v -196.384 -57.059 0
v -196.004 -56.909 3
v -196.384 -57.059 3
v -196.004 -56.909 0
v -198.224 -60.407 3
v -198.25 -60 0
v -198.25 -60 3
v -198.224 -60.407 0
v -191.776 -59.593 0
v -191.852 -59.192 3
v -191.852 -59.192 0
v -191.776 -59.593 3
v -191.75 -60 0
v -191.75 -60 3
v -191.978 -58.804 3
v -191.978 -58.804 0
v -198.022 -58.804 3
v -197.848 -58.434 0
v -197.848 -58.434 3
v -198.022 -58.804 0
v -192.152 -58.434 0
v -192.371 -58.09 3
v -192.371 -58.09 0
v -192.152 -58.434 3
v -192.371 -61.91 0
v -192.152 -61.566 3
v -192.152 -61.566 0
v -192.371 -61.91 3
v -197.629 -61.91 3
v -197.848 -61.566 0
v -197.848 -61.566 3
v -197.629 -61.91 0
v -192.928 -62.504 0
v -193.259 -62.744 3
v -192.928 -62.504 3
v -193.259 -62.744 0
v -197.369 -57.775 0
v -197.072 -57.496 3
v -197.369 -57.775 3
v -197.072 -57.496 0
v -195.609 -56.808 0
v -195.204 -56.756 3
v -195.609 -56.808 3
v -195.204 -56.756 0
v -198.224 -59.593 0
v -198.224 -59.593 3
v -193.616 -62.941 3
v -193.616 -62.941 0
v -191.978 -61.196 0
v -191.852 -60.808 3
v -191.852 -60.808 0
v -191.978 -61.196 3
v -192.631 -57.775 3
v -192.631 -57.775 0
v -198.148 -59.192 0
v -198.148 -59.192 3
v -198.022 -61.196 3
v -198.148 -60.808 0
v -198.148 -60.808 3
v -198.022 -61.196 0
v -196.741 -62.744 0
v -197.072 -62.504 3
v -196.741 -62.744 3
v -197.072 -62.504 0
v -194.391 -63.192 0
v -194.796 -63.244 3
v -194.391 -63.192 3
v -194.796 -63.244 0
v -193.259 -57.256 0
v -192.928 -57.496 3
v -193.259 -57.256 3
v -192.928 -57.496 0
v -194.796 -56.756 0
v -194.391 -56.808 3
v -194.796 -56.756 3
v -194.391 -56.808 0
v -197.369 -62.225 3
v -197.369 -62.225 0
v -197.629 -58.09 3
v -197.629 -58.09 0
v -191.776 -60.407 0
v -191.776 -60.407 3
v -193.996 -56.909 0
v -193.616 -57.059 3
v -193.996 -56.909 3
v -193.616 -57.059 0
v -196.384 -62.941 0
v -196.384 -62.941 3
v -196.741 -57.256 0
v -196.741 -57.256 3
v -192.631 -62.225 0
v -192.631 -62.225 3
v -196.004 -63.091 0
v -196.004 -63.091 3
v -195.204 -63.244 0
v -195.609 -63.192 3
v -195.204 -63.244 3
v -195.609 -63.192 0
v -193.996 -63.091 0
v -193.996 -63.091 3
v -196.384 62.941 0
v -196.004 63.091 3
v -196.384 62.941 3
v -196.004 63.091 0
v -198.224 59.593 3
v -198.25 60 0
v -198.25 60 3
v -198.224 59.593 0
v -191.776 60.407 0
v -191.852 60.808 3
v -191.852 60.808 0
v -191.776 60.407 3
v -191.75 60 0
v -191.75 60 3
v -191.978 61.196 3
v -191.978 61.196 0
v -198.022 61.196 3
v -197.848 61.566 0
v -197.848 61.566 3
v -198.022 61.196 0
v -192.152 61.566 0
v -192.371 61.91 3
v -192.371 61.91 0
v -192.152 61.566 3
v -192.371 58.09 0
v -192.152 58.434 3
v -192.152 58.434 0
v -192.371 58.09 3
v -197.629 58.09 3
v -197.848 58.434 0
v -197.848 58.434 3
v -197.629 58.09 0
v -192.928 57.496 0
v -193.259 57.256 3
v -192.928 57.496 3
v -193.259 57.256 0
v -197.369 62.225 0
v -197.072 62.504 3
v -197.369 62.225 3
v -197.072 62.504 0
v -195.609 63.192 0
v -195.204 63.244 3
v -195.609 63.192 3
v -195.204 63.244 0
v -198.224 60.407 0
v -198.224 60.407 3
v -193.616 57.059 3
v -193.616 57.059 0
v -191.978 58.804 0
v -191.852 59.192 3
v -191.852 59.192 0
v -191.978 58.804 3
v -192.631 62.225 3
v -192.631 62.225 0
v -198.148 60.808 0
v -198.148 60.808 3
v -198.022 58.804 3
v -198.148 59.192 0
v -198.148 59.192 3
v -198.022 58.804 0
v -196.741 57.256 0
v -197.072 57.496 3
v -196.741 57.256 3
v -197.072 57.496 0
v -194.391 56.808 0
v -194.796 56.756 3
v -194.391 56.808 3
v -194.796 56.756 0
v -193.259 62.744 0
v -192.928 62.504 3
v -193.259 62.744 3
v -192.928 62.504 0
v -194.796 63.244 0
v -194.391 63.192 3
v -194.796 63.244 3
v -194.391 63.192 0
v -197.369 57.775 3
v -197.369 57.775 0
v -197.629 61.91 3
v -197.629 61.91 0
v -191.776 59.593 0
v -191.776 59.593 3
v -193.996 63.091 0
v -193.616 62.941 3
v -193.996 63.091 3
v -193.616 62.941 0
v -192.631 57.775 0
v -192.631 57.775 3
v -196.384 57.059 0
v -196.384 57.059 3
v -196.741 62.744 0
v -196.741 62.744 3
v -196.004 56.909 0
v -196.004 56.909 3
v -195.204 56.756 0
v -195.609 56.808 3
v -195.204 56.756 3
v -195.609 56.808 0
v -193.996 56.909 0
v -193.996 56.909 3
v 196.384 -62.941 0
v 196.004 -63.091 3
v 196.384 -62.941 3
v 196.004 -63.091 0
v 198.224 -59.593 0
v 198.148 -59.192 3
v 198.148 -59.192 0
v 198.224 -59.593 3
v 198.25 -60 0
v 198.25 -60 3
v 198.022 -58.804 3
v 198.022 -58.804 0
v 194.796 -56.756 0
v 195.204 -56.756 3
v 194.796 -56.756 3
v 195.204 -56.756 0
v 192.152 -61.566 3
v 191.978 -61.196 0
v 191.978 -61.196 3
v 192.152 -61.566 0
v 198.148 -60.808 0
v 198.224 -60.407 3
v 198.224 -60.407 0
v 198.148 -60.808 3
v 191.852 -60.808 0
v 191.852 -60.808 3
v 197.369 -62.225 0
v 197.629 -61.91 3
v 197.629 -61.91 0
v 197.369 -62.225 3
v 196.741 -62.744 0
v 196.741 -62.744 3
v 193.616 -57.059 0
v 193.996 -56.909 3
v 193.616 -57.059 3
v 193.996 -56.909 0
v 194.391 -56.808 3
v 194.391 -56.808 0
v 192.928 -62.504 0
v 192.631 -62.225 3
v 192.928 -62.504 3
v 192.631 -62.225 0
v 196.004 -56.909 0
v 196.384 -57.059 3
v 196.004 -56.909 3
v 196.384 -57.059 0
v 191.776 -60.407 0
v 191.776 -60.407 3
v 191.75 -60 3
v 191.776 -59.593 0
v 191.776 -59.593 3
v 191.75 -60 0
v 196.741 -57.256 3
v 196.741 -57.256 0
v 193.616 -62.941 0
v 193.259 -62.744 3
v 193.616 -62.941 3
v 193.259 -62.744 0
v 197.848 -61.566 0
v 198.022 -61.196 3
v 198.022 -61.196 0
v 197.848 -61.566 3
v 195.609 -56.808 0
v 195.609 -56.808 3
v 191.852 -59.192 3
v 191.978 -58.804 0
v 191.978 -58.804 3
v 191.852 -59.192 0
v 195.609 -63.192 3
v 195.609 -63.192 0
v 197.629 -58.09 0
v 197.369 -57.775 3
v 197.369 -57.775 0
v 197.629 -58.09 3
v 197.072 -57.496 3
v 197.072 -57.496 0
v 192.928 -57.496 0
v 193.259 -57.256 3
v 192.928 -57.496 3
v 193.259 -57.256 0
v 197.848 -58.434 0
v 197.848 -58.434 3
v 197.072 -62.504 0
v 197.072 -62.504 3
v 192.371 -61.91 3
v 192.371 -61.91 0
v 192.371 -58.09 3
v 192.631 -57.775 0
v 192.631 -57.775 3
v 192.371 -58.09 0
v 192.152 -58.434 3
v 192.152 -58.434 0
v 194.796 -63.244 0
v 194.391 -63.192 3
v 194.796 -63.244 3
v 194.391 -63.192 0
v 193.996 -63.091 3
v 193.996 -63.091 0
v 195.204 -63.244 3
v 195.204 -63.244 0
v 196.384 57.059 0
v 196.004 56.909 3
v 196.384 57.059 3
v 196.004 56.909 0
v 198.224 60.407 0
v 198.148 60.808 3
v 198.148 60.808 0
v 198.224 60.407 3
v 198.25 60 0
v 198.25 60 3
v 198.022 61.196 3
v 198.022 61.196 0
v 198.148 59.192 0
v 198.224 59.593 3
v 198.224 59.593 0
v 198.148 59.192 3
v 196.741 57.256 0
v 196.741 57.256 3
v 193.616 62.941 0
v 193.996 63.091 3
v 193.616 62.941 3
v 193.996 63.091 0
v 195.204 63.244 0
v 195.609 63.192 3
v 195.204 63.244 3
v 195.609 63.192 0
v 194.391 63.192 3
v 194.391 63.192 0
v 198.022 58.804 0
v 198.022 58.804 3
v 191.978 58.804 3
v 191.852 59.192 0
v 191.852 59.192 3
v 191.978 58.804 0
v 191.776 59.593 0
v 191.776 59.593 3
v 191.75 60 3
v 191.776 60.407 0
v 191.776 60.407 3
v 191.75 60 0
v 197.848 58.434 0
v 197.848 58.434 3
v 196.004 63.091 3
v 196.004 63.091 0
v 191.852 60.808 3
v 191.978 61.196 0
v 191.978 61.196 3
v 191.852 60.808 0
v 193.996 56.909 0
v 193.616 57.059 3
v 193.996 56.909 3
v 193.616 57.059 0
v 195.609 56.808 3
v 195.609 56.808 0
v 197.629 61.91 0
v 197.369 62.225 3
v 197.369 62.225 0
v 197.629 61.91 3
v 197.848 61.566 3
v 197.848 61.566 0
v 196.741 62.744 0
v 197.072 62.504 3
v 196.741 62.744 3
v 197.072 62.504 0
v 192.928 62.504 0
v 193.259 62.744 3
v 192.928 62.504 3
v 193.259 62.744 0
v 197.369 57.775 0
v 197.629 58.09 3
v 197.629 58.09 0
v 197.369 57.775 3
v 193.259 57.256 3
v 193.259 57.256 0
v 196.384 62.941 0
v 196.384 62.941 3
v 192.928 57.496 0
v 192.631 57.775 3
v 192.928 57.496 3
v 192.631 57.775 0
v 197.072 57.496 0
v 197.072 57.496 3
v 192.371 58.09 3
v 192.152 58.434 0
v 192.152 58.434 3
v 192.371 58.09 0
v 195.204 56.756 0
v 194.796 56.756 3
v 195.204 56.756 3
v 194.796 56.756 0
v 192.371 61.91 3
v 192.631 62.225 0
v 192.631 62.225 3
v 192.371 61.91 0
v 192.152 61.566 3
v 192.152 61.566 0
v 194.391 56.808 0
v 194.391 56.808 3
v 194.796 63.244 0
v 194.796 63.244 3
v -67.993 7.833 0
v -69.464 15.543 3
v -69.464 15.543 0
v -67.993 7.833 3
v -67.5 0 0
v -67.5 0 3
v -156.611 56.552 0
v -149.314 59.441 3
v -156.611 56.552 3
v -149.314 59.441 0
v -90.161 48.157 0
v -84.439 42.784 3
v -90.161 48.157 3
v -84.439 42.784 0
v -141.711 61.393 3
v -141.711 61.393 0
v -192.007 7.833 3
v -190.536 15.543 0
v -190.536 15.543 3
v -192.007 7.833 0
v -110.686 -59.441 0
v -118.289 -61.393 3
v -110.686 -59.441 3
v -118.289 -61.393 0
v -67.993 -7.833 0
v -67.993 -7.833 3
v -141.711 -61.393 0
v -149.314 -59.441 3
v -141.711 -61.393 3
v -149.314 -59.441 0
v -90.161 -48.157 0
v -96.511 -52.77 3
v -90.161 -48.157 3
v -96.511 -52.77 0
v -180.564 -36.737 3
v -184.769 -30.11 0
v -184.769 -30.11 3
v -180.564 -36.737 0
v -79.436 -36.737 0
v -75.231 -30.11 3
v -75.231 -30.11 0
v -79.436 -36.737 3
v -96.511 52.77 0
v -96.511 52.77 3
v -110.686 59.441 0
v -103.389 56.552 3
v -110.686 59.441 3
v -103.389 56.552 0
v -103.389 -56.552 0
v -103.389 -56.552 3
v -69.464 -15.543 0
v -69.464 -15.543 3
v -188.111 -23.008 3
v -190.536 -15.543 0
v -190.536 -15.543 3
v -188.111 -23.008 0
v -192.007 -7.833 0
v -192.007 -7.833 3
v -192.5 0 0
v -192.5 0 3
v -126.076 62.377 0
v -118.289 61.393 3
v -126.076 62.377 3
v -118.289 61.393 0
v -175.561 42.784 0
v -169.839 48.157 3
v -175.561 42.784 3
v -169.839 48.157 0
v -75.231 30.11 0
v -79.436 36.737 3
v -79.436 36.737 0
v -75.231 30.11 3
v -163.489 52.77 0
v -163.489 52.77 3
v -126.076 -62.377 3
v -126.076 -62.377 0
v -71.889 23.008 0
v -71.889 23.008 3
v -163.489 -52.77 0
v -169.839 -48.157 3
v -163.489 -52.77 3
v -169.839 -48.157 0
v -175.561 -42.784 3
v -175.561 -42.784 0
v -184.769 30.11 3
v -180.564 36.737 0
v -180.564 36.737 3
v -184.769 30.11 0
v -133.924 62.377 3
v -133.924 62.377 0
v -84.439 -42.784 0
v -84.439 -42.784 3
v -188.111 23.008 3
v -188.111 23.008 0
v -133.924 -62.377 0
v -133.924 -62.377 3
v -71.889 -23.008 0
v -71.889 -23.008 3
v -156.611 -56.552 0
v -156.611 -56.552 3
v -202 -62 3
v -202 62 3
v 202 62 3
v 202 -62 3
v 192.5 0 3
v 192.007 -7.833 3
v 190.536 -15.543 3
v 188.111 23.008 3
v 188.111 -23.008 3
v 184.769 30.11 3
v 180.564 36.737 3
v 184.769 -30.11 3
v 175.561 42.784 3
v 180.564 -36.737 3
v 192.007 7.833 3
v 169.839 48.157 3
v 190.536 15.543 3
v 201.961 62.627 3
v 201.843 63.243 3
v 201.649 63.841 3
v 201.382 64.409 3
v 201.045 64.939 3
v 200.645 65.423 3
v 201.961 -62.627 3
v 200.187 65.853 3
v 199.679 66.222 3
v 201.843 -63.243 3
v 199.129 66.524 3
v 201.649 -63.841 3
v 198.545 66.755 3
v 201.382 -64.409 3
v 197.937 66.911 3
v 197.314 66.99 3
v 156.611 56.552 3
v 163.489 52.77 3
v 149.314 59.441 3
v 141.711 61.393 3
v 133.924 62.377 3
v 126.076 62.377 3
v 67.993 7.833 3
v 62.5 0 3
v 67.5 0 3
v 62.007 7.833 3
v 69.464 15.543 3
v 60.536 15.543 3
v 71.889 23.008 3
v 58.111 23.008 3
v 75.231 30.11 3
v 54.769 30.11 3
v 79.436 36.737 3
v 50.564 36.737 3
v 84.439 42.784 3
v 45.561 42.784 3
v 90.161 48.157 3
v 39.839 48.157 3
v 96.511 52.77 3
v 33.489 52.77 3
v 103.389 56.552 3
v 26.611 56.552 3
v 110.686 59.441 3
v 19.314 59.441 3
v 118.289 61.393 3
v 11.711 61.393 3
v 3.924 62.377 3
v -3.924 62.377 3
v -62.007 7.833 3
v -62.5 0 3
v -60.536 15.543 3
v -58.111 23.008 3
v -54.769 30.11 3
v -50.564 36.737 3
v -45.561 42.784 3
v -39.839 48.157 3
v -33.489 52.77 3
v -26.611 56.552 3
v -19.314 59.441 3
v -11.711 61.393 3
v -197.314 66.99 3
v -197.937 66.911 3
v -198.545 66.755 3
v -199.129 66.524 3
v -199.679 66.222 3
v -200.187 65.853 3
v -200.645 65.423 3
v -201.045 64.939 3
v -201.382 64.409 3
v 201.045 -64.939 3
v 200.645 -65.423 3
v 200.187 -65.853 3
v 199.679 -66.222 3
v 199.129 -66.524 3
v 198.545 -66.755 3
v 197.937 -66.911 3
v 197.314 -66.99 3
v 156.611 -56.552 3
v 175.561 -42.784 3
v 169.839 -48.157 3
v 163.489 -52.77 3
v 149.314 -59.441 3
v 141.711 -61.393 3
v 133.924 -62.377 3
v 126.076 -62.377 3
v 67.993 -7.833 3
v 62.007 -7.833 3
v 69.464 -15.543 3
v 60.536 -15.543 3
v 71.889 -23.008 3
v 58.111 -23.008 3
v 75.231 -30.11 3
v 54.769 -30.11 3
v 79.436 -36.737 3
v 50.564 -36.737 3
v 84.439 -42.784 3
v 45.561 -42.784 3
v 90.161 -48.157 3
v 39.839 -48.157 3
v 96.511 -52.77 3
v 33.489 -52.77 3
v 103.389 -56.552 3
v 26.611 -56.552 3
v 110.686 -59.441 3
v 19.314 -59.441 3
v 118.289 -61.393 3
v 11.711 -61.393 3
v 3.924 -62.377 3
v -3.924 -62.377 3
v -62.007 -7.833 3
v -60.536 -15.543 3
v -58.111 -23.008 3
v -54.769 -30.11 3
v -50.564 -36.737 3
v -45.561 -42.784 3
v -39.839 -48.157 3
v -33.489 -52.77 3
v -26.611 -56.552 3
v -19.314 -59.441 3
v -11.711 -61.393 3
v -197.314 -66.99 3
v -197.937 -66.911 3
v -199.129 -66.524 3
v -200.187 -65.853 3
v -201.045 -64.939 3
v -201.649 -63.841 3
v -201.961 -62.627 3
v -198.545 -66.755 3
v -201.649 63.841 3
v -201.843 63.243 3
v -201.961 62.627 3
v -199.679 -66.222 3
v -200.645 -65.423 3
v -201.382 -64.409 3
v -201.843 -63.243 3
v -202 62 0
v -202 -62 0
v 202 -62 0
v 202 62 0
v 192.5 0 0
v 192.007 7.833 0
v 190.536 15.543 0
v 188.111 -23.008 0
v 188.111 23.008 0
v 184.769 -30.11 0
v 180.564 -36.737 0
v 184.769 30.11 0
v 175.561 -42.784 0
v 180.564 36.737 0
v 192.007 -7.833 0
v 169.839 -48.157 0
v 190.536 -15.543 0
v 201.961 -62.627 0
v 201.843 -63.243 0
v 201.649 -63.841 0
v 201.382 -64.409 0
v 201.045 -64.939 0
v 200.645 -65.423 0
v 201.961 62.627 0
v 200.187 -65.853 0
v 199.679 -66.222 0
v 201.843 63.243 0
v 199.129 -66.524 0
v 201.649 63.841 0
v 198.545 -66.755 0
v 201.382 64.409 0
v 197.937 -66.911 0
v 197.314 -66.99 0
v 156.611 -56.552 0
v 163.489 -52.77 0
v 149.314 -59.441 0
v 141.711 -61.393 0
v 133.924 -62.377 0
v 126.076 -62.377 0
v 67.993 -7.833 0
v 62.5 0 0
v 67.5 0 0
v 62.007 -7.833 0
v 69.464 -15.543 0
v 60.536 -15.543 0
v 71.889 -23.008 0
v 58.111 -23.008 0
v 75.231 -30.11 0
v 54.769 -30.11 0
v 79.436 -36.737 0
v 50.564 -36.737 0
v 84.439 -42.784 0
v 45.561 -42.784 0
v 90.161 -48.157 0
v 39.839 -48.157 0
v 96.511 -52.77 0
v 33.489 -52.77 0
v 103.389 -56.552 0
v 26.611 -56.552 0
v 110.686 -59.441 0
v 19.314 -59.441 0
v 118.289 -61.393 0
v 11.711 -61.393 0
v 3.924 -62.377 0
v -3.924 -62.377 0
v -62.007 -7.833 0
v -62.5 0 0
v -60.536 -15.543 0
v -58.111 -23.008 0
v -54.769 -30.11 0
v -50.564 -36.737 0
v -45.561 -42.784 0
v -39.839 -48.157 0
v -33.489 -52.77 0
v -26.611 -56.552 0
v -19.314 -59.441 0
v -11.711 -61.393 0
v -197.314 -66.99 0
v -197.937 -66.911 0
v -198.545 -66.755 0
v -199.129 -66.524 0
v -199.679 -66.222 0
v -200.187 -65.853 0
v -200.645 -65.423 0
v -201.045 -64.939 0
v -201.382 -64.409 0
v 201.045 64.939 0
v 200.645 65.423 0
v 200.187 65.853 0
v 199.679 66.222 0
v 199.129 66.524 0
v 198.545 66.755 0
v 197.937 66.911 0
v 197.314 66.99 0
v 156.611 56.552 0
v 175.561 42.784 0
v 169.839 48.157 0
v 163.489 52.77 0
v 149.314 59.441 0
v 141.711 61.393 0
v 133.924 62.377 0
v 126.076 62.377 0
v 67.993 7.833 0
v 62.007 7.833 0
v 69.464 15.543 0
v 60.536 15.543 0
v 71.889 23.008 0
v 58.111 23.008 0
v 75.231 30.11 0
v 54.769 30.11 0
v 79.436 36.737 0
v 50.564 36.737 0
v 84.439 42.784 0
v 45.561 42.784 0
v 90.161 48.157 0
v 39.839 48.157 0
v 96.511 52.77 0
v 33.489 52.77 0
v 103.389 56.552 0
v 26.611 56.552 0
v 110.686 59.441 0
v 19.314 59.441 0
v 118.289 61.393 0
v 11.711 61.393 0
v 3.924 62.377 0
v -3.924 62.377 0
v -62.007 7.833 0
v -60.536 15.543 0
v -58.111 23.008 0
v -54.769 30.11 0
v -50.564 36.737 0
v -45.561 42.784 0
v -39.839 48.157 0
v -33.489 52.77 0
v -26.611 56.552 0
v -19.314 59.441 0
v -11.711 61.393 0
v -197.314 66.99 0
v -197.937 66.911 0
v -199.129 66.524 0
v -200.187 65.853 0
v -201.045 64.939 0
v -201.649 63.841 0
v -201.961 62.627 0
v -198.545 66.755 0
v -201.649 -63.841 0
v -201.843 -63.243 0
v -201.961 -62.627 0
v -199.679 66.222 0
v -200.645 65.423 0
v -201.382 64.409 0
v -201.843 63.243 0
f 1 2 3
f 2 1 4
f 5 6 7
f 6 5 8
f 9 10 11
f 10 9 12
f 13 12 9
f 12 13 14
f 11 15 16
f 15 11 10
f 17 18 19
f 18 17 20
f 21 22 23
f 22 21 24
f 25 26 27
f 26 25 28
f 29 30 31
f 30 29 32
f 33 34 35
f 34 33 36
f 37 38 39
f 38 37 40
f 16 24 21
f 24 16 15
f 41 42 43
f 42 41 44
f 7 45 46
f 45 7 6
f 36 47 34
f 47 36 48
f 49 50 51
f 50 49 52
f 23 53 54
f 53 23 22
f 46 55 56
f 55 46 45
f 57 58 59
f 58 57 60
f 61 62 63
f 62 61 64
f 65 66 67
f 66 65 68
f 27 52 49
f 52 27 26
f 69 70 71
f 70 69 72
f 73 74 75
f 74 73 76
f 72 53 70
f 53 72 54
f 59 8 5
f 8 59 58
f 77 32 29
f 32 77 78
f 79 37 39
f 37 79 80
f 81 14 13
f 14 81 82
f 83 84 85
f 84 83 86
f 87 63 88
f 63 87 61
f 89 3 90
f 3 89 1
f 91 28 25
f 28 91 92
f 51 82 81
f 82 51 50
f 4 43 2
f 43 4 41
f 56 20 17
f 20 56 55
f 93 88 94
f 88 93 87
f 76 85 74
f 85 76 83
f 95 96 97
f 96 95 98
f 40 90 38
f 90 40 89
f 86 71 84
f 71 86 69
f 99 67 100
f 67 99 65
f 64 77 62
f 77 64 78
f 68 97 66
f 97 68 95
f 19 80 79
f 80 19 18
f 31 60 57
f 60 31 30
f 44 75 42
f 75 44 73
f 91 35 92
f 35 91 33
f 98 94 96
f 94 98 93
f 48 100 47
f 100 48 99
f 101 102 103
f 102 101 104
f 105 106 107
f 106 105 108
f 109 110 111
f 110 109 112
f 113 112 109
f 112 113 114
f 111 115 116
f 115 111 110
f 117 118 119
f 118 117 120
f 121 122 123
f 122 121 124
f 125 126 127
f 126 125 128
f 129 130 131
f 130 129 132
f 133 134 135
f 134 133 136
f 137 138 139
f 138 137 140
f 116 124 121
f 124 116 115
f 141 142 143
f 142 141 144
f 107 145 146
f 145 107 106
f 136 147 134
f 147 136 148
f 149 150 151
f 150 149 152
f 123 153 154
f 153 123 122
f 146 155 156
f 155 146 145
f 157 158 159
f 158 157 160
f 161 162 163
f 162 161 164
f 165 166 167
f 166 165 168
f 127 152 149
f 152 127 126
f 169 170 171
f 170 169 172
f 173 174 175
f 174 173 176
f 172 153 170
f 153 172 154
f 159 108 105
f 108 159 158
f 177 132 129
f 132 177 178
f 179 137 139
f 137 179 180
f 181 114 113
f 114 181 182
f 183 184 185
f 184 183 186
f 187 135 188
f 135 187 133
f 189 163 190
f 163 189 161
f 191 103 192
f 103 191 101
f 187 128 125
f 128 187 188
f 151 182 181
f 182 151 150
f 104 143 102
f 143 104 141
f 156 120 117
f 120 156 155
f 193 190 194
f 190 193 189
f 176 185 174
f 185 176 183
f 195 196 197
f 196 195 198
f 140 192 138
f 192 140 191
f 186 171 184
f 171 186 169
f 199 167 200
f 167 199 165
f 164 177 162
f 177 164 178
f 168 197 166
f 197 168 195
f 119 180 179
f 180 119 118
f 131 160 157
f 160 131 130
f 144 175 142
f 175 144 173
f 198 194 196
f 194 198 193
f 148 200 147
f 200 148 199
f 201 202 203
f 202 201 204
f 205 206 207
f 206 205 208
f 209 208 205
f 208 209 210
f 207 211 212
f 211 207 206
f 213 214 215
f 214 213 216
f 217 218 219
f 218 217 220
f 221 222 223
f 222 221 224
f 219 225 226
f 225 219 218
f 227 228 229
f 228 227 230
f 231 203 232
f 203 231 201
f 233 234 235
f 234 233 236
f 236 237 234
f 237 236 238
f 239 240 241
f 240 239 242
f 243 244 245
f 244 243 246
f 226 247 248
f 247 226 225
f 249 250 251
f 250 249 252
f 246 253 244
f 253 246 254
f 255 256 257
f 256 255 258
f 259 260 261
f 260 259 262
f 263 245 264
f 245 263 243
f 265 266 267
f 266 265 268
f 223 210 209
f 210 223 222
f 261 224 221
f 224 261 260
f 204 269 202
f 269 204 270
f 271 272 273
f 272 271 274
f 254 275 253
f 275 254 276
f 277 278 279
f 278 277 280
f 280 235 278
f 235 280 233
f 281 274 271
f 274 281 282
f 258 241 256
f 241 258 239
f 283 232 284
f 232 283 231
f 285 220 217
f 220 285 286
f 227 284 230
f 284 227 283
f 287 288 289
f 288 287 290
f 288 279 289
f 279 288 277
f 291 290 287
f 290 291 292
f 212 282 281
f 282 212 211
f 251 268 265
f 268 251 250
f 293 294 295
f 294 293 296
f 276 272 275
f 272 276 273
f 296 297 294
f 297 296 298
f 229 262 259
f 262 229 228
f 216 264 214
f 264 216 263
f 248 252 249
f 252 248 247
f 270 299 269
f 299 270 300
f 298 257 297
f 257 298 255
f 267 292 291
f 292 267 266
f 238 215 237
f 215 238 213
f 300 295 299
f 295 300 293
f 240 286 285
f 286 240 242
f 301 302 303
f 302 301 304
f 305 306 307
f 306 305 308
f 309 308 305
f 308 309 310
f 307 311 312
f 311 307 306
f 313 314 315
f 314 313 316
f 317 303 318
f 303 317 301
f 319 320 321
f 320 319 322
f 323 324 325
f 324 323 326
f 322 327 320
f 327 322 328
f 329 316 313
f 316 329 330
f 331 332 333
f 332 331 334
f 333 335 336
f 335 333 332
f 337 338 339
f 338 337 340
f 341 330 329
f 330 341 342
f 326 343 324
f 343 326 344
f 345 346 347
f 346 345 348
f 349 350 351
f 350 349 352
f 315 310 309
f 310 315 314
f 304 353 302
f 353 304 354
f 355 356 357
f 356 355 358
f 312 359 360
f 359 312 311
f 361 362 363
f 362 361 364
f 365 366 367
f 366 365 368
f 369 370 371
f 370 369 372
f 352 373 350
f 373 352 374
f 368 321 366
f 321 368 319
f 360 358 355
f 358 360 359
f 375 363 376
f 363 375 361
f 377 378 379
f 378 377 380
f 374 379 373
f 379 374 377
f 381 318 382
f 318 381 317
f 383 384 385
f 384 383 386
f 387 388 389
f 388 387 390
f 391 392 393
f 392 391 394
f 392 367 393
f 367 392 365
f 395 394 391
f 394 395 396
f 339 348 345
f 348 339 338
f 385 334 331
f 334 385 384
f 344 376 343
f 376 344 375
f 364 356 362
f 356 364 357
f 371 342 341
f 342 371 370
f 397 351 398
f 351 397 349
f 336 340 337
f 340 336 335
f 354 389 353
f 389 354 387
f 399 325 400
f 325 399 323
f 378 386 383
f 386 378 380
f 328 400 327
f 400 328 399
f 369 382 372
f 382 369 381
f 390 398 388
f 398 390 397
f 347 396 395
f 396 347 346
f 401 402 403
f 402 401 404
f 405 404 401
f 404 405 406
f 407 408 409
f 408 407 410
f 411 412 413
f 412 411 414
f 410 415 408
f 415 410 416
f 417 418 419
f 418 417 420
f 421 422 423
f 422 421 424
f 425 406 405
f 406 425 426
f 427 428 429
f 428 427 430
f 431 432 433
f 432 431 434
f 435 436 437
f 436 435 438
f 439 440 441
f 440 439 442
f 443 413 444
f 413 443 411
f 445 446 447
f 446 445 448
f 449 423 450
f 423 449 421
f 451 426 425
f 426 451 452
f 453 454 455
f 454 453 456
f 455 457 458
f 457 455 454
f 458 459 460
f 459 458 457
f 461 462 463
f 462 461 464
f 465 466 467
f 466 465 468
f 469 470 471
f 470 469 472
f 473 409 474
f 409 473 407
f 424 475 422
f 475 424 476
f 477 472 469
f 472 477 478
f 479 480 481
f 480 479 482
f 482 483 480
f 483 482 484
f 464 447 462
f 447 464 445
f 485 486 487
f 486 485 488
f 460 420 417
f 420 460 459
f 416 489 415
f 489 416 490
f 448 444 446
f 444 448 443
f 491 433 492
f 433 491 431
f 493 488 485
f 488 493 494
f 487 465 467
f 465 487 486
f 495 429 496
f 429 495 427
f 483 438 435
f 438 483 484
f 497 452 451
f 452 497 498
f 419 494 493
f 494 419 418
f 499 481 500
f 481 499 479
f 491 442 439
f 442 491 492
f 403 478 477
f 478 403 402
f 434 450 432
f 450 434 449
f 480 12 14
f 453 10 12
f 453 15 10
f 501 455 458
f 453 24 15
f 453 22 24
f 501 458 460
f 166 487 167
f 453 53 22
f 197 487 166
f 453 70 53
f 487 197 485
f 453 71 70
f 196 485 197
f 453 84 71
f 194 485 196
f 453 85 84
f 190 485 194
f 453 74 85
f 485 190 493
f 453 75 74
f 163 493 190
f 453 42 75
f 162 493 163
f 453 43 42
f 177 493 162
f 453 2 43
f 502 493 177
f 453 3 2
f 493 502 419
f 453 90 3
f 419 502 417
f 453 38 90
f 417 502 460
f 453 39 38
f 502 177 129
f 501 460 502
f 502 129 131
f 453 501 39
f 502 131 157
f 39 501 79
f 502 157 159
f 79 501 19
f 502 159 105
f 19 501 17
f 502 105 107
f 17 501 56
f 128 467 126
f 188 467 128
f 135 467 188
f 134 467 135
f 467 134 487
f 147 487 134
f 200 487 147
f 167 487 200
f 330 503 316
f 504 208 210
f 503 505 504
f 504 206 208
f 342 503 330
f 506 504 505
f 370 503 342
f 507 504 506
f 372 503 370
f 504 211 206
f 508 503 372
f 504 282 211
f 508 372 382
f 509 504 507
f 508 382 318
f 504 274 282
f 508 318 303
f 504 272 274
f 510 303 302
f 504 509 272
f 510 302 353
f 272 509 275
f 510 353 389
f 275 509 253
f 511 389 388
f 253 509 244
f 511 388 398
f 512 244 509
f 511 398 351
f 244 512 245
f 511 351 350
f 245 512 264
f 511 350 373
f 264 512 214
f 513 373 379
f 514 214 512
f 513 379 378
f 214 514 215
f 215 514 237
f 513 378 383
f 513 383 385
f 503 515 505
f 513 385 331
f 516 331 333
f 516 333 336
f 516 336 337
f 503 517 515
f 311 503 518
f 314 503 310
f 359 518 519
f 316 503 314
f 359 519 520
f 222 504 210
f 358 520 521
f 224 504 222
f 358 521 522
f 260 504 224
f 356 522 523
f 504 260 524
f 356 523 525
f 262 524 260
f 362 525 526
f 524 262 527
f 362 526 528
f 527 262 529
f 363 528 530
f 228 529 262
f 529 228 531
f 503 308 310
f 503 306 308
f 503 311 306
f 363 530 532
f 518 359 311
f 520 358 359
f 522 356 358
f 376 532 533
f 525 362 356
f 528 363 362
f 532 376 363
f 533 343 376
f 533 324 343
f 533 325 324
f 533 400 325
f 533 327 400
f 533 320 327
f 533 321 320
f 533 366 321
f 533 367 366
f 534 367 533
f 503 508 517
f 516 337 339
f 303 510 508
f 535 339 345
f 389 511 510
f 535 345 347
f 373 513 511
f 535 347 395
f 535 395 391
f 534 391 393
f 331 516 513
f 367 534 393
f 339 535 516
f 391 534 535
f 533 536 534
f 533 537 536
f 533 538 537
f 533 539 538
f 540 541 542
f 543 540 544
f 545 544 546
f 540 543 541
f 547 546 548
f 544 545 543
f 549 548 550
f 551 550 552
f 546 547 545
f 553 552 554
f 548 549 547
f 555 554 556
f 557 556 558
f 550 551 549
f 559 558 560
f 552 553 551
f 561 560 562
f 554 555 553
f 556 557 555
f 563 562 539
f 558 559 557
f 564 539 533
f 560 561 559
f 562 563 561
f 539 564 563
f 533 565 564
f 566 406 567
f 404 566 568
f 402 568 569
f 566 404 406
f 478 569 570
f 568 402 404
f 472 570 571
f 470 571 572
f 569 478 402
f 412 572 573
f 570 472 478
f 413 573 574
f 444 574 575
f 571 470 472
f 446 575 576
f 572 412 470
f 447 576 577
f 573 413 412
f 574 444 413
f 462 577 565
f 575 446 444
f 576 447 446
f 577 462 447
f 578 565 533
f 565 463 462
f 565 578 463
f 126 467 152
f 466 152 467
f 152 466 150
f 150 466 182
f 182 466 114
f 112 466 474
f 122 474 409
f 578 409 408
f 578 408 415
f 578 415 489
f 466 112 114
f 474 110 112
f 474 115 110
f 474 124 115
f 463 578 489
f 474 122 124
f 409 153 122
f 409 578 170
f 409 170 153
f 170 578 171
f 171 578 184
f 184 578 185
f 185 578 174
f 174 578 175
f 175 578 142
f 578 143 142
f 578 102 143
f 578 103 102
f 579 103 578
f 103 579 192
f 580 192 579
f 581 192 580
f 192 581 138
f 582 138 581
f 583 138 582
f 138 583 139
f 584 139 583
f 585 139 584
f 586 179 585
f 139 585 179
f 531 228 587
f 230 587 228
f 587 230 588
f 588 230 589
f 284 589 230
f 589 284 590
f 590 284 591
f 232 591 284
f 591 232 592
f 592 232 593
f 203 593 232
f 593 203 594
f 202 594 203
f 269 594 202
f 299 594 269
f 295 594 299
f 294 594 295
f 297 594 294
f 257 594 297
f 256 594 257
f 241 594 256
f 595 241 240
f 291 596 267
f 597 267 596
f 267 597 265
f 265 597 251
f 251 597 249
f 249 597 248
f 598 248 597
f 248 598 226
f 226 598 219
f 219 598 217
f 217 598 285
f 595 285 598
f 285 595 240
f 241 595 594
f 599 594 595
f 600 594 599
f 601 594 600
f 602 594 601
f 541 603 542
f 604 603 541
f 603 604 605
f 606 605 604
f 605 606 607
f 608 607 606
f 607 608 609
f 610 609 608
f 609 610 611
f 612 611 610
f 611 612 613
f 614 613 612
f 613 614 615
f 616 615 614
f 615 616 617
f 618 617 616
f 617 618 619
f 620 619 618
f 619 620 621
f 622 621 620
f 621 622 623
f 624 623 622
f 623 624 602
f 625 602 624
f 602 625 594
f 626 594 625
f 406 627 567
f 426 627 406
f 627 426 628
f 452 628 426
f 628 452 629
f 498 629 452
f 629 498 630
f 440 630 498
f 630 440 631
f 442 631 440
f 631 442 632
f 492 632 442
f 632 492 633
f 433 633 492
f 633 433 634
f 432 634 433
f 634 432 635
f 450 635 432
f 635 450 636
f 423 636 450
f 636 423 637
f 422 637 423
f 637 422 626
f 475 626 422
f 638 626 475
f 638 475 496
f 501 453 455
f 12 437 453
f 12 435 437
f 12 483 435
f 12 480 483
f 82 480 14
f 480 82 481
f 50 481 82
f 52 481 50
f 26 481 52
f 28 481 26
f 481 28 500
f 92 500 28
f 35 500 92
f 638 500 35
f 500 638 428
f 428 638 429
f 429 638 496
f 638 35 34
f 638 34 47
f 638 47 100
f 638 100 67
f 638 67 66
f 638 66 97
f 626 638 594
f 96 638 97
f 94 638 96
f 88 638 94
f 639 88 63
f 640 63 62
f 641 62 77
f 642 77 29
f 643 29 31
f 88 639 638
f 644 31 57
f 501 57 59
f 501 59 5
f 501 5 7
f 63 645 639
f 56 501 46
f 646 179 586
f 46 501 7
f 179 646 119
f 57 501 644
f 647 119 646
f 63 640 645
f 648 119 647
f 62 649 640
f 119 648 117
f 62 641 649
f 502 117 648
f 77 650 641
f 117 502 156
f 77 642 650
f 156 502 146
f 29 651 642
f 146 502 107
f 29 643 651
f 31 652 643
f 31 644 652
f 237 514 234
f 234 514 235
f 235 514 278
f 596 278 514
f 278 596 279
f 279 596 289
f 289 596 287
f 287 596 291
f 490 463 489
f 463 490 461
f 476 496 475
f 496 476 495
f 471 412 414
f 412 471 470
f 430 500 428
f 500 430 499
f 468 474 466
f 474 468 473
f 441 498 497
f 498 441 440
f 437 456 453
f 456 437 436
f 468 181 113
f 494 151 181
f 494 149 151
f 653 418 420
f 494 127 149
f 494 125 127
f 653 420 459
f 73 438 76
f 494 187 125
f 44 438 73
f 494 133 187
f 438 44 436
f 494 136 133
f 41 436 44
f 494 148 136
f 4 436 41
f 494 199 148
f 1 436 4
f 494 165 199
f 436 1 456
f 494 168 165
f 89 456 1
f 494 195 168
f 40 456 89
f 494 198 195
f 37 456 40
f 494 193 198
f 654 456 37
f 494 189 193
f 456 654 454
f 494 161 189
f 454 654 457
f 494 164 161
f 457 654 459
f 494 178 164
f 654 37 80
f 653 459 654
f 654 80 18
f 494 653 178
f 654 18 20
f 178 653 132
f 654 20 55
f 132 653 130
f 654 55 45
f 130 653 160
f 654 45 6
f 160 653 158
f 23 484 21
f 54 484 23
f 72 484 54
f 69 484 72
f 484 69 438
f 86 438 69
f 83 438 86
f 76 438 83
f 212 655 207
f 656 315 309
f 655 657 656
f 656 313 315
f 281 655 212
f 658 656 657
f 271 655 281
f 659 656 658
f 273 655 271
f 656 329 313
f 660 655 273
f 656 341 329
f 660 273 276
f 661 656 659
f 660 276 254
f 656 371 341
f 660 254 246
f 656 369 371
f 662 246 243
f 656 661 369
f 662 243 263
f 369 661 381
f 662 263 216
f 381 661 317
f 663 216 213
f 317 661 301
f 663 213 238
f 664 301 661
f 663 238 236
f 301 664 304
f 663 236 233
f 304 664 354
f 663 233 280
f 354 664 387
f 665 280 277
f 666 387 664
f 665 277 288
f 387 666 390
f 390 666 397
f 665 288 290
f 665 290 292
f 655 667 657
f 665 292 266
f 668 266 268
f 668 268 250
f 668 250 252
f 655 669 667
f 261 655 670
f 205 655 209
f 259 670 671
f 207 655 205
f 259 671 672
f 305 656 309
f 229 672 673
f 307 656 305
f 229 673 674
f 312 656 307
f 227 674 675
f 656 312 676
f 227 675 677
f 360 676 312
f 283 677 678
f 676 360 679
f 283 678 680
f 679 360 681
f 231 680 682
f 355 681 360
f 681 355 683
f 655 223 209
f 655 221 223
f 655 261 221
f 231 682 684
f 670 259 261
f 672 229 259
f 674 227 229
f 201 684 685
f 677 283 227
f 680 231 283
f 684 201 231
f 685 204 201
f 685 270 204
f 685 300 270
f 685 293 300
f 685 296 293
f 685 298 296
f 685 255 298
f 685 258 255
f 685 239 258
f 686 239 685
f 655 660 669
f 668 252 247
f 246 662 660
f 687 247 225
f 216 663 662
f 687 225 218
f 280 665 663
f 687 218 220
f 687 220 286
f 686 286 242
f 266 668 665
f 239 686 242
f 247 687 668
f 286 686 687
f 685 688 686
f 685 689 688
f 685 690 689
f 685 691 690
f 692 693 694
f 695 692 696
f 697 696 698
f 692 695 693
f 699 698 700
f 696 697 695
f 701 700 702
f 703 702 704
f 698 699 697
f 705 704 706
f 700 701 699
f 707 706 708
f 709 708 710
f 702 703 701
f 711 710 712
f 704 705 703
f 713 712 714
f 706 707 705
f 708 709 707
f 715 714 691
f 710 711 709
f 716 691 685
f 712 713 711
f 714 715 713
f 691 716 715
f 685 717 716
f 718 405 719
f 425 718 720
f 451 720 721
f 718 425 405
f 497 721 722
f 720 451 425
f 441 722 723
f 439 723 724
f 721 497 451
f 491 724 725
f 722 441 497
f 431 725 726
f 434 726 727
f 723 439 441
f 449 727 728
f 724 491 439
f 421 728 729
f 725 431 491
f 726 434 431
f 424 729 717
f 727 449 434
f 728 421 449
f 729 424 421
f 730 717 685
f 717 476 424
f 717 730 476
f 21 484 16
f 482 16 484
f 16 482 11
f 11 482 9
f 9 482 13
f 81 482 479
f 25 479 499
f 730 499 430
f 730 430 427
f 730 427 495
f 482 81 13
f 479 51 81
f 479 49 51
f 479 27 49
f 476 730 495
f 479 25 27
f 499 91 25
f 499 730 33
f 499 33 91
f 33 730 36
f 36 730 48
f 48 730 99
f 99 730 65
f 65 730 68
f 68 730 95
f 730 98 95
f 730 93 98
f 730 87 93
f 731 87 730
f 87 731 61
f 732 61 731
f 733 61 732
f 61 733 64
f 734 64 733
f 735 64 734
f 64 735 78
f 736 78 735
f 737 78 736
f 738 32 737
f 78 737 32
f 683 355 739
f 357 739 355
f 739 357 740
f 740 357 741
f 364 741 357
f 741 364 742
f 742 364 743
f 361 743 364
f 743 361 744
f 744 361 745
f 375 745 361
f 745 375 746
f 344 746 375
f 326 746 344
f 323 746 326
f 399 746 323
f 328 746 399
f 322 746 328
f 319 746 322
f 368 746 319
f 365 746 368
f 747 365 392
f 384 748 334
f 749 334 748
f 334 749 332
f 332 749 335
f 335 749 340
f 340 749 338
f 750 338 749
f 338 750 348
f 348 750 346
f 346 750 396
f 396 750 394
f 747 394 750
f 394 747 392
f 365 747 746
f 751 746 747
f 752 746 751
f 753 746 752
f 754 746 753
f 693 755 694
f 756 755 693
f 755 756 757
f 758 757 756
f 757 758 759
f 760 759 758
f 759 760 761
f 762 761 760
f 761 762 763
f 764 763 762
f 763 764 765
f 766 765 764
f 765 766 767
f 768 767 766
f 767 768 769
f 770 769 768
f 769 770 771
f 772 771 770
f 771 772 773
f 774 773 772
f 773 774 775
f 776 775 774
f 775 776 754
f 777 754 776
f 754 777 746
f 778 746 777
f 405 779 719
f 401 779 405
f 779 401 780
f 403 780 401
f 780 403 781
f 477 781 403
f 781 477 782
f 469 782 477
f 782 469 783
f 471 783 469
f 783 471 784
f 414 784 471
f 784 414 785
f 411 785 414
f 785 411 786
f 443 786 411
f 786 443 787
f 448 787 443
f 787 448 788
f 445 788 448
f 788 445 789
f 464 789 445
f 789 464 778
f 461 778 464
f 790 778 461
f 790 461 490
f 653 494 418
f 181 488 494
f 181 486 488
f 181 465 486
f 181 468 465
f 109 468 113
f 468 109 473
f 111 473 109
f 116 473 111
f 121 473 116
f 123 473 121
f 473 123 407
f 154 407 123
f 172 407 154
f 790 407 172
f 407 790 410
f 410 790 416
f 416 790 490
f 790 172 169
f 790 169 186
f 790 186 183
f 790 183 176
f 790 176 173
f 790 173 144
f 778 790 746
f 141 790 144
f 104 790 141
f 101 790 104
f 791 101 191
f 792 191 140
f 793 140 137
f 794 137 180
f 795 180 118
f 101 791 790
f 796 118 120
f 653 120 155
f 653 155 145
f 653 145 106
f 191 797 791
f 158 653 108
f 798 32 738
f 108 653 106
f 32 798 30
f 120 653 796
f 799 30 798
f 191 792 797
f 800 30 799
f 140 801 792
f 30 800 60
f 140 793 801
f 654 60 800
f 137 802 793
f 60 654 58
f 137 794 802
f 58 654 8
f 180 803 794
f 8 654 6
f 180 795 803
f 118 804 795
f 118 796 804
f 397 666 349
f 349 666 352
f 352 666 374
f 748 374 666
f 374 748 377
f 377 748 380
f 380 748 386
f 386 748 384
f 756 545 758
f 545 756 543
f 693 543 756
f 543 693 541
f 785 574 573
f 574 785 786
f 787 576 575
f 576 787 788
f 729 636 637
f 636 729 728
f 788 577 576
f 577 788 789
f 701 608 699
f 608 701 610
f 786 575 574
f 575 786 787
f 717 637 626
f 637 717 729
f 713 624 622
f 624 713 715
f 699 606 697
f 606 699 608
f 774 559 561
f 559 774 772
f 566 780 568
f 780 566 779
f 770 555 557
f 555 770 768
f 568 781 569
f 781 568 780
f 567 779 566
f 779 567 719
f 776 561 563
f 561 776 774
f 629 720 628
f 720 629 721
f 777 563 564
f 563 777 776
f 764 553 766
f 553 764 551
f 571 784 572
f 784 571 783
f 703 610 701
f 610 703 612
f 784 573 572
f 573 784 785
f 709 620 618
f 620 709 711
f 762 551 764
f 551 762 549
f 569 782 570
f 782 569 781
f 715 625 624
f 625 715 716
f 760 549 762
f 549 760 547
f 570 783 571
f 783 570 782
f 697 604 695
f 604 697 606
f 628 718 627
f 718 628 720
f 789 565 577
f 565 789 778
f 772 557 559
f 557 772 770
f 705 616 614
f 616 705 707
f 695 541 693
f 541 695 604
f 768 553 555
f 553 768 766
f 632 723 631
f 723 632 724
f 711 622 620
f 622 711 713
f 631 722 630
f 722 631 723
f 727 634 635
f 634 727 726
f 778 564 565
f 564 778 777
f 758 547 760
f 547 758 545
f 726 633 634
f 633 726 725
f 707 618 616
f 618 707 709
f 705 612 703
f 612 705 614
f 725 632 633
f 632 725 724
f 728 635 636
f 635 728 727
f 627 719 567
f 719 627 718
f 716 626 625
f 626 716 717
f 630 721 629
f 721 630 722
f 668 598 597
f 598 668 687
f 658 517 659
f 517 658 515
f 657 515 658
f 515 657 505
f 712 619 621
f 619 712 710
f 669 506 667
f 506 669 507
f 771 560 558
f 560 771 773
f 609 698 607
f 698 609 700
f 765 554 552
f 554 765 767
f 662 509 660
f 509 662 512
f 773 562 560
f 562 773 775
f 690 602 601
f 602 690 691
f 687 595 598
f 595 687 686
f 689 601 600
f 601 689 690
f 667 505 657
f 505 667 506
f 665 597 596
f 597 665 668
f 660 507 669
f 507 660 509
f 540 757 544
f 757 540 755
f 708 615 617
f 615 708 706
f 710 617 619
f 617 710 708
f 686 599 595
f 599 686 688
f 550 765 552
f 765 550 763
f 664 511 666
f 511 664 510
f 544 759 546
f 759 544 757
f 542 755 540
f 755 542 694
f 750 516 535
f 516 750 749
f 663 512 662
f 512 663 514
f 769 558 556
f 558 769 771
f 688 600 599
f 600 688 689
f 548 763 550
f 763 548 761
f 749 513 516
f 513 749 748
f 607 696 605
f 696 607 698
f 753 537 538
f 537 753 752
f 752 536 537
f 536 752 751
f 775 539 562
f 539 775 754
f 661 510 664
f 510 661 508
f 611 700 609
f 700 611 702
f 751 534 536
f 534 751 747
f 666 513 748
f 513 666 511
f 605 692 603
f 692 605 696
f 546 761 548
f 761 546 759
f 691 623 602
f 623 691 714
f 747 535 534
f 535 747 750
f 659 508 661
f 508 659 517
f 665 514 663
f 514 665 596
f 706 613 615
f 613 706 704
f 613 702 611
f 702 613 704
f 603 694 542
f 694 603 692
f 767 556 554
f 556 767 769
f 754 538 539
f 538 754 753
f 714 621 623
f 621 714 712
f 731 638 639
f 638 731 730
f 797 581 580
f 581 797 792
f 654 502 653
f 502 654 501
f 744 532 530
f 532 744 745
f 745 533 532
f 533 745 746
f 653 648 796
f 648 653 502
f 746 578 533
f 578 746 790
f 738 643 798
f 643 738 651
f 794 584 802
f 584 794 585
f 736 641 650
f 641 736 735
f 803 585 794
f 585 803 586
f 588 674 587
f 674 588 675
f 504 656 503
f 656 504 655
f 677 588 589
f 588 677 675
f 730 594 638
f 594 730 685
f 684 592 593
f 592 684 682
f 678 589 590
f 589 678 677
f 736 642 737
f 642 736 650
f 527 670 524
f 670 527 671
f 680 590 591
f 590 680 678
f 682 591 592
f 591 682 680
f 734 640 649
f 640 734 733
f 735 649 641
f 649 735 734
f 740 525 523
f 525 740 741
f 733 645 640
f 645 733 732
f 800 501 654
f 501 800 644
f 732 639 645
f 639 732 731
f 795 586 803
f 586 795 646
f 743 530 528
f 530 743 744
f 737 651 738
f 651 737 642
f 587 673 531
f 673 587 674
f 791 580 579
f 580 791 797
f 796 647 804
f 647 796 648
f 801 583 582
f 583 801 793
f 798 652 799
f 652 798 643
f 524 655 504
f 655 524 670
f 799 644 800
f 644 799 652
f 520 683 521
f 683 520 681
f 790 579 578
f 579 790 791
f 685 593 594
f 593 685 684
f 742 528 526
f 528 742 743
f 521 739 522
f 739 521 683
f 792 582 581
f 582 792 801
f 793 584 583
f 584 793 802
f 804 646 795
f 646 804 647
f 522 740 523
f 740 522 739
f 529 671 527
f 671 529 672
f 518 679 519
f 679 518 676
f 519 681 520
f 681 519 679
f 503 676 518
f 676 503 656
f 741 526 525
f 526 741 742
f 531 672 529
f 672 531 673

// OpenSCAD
$fn = 50;


difference() {
	union() {
		hull() {
			translate(v = [-197.0000000000, 62.0000000000, 0]) {
				cylinder(h = 3, r = 5);
			}
			translate(v = [197.0000000000, 62.0000000000, 0]) {
				cylinder(h = 3, r = 5);
			}
			translate(v = [-197.0000000000, -62.0000000000, 0]) {
				cylinder(h = 3, r = 5);
			}
			translate(v = [197.0000000000, -62.0000000000, 0]) {
				cylinder(h = 3, r = 5);
			}
		}
	}
	union() {
		#translate(v = [-195.0000000000, -60.0000000000, -100.0000000000]) {
			cylinder(h = 200, r = 3.2500000000);
		}
		#translate(v = [-195.0000000000, 60.0000000000, -100.0000000000]) {
			cylinder(h = 200, r = 3.2500000000);
		}
		#translate(v = [195.0000000000, -60.0000000000, -100.0000000000]) {
			cylinder(h = 200, r = 3.2500000000);
		}
		#translate(v = [195.0000000000, 60.0000000000, -100.0000000000]) {
			cylinder(h = 200, r = 3.2500000000);
		}
		#translate(v = [-130.0000000000, 0, 0]) {
			cylinder(h = 3, r = 62.5000000000);
		}
		#cylinder(h = 3, r = 62.5000000000);
		#translate(v = [130.0000000000, 0, 0]) {
			cylinder(h = 3, r = 62.5000000000);
		}
	}
}
